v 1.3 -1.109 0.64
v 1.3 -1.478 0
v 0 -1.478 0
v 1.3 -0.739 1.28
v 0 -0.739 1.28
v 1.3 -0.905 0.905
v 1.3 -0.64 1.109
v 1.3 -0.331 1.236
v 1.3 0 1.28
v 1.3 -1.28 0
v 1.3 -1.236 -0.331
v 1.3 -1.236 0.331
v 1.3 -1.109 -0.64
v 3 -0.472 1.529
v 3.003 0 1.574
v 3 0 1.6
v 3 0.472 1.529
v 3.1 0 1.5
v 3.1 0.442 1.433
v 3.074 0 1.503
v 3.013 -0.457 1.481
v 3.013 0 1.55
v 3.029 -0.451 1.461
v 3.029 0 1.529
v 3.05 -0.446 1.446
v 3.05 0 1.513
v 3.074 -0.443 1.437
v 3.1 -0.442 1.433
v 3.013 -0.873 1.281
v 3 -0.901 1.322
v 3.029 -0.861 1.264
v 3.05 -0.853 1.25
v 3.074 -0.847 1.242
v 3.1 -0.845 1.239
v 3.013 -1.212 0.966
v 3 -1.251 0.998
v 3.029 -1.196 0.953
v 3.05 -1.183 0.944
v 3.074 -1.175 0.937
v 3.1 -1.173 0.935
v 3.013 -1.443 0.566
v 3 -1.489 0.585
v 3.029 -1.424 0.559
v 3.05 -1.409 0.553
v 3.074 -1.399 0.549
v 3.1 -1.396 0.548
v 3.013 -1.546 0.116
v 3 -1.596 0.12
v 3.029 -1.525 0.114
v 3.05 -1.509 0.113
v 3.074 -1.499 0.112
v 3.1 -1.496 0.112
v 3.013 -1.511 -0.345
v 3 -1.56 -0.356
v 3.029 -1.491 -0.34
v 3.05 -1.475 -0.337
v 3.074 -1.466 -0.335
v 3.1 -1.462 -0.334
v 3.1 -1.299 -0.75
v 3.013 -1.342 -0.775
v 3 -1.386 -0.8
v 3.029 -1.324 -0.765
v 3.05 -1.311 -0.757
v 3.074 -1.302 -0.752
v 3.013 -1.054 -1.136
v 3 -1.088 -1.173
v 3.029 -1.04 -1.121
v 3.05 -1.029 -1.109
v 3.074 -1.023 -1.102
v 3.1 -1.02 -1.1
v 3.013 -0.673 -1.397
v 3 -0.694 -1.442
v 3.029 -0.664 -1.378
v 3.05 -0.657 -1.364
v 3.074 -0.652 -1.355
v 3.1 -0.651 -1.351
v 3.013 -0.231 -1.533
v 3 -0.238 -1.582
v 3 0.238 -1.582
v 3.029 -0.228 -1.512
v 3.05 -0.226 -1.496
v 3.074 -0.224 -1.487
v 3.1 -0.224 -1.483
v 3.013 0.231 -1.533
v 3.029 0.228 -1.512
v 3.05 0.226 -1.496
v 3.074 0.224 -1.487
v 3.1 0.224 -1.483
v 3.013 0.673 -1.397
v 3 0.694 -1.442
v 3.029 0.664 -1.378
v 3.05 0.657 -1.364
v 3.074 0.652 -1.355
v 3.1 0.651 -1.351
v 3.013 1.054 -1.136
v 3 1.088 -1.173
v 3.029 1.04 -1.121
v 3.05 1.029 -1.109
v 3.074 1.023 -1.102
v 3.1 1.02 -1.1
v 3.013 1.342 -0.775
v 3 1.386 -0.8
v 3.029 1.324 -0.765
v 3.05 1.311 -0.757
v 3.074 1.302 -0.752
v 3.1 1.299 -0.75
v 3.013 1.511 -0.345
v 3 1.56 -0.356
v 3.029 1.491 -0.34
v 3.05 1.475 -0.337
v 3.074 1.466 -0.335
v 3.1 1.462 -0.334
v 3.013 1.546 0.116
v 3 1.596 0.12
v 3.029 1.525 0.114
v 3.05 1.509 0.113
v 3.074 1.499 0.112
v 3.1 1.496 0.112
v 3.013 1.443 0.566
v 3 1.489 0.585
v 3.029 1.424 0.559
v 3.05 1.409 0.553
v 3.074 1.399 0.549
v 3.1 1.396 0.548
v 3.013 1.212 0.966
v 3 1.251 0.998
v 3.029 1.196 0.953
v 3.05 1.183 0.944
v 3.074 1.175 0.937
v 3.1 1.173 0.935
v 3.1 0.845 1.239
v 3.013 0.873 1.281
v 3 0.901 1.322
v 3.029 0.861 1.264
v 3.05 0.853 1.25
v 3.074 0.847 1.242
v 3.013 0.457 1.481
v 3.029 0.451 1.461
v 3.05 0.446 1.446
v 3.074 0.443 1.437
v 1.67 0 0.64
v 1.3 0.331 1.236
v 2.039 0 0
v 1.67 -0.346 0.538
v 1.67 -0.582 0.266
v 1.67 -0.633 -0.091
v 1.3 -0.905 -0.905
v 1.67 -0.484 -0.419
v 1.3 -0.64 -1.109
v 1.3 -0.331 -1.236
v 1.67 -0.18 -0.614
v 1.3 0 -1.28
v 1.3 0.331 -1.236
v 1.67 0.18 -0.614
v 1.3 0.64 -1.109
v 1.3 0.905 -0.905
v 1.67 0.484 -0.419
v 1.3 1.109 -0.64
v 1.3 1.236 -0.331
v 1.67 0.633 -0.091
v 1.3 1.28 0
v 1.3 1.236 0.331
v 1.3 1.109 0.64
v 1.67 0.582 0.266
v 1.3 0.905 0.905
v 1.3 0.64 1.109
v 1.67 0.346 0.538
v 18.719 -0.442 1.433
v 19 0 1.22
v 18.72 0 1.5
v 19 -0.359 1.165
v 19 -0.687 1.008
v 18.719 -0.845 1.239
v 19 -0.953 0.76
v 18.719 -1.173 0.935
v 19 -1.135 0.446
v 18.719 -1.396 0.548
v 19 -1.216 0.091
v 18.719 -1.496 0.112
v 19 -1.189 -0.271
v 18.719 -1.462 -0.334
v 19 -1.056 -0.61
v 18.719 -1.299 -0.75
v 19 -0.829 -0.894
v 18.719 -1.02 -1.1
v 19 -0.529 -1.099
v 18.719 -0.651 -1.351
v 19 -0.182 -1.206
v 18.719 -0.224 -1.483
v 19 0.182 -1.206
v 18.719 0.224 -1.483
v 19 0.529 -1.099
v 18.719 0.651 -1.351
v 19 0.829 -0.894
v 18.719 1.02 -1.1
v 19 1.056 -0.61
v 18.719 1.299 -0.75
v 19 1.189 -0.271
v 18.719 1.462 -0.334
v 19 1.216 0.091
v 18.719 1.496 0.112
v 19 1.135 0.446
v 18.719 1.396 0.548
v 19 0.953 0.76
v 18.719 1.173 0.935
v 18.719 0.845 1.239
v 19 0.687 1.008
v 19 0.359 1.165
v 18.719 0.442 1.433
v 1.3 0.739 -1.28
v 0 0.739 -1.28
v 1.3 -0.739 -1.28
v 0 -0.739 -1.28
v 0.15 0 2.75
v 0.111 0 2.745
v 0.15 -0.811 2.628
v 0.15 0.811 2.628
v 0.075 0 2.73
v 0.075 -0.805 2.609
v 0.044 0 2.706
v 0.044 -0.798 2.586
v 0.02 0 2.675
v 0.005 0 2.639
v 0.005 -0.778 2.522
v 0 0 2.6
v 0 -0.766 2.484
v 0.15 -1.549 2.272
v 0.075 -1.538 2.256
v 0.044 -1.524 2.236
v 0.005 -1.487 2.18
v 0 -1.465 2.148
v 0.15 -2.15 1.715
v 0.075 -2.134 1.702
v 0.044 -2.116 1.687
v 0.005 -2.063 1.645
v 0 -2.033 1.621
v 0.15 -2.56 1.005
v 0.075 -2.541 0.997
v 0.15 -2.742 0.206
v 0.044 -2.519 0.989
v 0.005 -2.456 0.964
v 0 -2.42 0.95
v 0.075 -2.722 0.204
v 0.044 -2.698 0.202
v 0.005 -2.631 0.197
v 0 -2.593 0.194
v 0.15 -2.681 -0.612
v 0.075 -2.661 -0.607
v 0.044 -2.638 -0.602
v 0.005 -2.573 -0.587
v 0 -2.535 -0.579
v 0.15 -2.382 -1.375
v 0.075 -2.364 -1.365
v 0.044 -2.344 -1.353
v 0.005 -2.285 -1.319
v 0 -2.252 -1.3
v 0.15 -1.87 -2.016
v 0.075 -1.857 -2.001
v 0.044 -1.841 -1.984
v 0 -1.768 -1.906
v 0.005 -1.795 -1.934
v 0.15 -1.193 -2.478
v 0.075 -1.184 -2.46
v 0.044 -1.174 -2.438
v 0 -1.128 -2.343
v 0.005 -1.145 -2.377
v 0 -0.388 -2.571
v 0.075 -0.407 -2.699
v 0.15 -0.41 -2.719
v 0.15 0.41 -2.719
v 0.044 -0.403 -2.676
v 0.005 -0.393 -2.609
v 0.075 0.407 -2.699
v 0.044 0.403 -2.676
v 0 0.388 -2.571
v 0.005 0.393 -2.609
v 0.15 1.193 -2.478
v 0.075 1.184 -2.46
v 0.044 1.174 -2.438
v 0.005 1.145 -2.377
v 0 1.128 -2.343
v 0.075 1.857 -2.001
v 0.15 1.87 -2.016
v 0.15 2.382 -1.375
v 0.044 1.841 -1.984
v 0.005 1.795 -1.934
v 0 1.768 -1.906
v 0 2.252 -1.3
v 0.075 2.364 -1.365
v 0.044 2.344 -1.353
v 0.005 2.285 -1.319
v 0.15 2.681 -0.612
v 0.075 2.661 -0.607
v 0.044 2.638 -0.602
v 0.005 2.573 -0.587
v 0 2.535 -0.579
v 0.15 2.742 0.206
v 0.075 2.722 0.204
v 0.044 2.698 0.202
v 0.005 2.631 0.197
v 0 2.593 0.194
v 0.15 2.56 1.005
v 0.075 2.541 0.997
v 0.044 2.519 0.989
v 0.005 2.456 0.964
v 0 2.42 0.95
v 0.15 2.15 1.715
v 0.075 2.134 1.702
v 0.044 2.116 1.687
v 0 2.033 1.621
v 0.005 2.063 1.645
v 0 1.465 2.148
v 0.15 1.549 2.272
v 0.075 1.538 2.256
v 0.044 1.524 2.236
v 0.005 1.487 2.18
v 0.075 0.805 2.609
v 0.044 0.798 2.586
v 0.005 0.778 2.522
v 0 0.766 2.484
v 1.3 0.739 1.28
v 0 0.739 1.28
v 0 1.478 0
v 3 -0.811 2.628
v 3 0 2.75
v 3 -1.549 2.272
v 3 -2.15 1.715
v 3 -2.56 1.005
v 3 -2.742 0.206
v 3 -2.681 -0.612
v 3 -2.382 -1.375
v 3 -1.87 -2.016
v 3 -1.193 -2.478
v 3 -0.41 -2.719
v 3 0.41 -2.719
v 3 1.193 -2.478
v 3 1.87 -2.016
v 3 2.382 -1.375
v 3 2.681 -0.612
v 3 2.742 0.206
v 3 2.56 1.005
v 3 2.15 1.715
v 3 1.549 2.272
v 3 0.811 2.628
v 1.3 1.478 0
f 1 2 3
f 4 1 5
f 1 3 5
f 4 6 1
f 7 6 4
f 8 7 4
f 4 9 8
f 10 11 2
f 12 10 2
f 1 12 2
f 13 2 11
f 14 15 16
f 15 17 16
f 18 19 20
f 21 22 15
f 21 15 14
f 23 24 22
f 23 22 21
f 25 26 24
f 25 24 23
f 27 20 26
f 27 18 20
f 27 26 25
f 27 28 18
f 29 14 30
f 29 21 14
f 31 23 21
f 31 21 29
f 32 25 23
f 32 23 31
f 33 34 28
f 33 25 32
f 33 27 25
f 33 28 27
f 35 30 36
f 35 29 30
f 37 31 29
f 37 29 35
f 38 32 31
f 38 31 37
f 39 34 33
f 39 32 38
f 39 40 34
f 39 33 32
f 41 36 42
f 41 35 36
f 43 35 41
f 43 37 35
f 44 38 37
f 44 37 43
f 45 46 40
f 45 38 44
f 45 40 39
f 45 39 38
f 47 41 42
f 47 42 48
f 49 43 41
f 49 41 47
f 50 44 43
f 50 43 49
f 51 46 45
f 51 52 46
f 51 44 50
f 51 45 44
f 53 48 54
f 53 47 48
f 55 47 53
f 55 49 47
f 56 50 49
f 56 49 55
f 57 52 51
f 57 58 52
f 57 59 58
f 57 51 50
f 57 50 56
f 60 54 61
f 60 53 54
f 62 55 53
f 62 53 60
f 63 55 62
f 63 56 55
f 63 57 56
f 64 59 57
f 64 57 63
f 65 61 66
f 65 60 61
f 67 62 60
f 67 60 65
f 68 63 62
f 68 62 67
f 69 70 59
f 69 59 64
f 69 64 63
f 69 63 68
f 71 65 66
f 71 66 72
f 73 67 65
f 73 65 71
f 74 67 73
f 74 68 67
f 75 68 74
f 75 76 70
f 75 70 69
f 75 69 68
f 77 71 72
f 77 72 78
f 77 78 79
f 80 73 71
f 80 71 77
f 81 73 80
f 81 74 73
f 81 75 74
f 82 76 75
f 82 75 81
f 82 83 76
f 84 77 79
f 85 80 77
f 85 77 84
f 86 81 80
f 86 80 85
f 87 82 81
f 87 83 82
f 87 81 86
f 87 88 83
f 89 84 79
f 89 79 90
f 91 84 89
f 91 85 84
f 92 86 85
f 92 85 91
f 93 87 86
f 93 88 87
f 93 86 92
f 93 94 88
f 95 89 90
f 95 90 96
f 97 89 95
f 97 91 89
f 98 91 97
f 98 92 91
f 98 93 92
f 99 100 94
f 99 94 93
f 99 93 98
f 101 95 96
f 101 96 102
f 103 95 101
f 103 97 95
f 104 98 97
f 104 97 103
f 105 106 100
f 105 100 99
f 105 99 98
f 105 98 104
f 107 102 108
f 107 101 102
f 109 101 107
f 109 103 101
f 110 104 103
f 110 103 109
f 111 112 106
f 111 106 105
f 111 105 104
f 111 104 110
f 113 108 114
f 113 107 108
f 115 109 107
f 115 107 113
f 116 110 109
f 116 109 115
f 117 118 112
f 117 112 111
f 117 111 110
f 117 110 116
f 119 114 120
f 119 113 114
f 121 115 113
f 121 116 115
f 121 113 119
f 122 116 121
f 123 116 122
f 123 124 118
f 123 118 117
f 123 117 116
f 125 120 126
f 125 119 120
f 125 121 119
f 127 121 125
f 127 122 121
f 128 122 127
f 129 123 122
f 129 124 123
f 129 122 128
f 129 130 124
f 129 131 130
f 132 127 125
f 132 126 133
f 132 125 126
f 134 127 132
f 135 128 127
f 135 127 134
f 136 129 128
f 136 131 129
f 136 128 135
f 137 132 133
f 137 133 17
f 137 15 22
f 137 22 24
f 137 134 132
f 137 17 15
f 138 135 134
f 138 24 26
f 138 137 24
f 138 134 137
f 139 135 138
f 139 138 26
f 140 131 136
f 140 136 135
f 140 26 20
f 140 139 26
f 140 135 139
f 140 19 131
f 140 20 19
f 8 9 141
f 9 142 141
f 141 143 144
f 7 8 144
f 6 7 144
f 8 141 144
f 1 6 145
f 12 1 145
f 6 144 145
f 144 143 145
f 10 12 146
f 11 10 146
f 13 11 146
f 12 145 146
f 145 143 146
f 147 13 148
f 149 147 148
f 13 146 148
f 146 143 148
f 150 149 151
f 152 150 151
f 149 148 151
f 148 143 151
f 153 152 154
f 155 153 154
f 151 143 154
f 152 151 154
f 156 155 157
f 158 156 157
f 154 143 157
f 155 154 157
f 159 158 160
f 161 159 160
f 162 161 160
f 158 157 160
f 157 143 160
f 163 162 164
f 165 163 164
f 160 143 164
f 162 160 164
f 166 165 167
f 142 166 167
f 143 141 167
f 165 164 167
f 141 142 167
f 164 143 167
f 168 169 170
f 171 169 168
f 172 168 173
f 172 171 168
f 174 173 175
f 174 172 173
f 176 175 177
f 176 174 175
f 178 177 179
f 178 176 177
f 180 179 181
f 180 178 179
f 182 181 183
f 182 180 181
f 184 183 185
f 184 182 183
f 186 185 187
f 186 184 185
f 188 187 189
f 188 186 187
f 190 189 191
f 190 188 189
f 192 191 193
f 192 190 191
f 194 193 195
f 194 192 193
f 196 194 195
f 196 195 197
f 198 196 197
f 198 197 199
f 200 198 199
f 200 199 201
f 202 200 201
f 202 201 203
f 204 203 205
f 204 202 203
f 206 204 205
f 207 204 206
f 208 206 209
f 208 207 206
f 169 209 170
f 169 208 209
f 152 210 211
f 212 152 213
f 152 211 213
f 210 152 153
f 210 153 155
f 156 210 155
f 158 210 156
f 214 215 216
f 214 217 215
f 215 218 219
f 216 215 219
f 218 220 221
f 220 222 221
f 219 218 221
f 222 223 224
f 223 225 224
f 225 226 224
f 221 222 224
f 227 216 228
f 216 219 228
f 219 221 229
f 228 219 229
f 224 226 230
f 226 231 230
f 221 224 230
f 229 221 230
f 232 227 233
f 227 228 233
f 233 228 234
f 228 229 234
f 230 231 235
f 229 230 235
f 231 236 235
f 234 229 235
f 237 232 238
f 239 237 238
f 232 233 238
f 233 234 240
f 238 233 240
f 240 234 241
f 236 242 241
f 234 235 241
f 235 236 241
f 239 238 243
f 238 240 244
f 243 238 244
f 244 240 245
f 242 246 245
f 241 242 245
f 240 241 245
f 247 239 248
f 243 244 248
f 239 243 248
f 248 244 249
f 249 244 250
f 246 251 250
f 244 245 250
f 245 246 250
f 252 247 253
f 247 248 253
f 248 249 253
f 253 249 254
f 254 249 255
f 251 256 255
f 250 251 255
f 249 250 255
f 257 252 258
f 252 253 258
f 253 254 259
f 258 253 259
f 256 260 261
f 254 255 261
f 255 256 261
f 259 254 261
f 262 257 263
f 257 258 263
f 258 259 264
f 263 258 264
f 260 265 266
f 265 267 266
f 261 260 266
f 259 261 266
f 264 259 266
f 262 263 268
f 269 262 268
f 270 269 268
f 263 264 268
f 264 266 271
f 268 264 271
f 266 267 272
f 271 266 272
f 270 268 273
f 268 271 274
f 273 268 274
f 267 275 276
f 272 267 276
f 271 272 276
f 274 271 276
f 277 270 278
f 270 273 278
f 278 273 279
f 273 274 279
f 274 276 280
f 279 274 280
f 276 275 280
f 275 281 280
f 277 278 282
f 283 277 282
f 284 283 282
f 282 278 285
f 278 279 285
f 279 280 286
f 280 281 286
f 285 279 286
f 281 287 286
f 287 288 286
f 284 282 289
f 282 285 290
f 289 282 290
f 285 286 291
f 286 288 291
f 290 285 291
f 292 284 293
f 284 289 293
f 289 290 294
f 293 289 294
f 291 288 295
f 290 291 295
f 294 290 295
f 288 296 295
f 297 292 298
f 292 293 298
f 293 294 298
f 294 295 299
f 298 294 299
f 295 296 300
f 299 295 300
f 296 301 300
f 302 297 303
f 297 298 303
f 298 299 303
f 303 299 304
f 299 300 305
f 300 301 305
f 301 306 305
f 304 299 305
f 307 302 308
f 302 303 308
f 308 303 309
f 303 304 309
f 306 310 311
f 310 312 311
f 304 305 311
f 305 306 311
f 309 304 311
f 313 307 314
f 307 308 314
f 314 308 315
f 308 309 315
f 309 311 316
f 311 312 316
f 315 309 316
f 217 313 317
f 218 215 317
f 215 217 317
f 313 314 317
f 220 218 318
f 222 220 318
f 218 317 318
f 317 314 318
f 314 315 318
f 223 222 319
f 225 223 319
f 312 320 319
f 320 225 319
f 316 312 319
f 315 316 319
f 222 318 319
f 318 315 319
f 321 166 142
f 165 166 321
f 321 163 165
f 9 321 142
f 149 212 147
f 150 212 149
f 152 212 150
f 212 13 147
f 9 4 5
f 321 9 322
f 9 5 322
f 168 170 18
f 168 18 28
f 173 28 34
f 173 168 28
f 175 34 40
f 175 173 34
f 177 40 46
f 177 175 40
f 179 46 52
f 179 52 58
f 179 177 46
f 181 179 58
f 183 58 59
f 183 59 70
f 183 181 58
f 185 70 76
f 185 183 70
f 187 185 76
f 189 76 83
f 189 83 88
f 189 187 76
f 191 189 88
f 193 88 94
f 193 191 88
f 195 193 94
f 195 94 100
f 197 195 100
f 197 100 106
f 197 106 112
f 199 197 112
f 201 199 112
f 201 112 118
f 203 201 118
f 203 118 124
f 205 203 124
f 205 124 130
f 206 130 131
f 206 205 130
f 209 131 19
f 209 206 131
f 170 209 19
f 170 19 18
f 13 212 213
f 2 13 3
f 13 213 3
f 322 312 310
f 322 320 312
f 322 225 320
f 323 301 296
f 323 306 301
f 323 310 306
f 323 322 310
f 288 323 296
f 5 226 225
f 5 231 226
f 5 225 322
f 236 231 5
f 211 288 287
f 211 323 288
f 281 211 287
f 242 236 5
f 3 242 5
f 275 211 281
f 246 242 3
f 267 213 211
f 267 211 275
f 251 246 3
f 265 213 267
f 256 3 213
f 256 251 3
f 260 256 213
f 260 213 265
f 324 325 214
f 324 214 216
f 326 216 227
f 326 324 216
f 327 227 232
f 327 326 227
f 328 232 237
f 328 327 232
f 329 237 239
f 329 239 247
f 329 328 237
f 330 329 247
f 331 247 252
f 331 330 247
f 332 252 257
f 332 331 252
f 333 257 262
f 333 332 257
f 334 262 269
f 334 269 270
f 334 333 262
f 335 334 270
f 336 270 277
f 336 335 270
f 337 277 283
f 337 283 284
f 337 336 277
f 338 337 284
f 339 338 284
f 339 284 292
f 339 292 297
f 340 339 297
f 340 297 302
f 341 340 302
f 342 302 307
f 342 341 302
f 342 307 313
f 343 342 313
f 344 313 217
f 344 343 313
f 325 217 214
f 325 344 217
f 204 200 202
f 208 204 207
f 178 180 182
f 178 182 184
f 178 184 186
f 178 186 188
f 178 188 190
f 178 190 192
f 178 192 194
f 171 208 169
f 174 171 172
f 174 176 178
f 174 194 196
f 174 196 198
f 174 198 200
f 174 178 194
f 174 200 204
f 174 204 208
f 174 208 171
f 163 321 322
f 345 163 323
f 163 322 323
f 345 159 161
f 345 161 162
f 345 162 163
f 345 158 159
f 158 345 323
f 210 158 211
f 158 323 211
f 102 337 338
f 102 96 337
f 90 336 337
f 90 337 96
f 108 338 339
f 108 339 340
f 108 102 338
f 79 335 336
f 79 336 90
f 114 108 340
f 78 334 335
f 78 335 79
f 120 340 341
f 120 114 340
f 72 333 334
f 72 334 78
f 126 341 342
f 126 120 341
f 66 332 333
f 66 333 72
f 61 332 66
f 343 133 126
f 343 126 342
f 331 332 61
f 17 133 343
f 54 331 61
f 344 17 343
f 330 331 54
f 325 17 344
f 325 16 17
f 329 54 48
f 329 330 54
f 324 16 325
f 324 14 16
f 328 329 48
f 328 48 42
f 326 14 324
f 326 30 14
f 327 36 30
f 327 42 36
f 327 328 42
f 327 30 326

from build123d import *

# Parameters (mm, degrees)
FILLET1_R   = 0.1
FILLET2_R   = 0.15
HEX_2_DEPTH = 1.3


with BuildPart() as part:
    # BodySke → Base-Revolve (revolve)
    with BuildSketch(Plane.XY, mode=Mode.PRIVATE) as base_revolve_sk:
        Polygon((0, 0), (0, 2.75), (3, 2.75), (3, 1.5), (18.7195, 1.5), (19, 1.2195), (19, 0), align=None)
    revolve(base_revolve_sk.sketch.rotate(Axis((-31.75, 0, 0), (1, 0, 0)), 90), axis=Axis((-31.75, 0, 0), (1, 0, 0)))  # turned: the seam where the file's is

    # Fillet1
    fillet1_edges = [part.edges().sort_by_distance(p)[0] for p in [
        (3, 0, -1.5),
    ]]
    fillet(fillet1_edges, radius=FILLET1_R)

    # Fillet2
    fillet2_edges = [part.edges().sort_by_distance(p)[0] for p in [
        (0, 0, -2.75),
    ]]
    fillet(fillet2_edges, radius=FILLET2_R)

    # Sketch2 → Hex-PreBroach (revolve, cut)
    with BuildSketch(Plane.XY, mode=Mode.PRIVATE) as hex_prebroach_sk:
        Polygon((0, 1.28), (1.3, 1.28), (2.039008345, 0), (0, 0), align=None)
    revolve(hex_prebroach_sk.sketch.rotate(Axis((0, 0, 0), (1, 0, 0)), 90), axis=Axis((0, 0, 0), (1, 0, 0)), mode=Mode.SUBTRACT)  # turned: the seam where the file's is

    # Sketch3 → Hex 2 (cut)
    with BuildSketch(Plane(origin=(0, 0, 0), x_dir=(0, 0.5, 0.866025404), z_dir=(-1, 0, 0))):
        Polygon((0.739008345, 1.28), (-0.739008345, 1.28), (-1.478016689, 0), (-0.739008345, -1.28), (0.739008345, -1.28), (1.478016689, 0), align=None)
    extrude(amount=-HEX_2_DEPTH, mode=Mode.SUBTRACT)


solid = part.part
